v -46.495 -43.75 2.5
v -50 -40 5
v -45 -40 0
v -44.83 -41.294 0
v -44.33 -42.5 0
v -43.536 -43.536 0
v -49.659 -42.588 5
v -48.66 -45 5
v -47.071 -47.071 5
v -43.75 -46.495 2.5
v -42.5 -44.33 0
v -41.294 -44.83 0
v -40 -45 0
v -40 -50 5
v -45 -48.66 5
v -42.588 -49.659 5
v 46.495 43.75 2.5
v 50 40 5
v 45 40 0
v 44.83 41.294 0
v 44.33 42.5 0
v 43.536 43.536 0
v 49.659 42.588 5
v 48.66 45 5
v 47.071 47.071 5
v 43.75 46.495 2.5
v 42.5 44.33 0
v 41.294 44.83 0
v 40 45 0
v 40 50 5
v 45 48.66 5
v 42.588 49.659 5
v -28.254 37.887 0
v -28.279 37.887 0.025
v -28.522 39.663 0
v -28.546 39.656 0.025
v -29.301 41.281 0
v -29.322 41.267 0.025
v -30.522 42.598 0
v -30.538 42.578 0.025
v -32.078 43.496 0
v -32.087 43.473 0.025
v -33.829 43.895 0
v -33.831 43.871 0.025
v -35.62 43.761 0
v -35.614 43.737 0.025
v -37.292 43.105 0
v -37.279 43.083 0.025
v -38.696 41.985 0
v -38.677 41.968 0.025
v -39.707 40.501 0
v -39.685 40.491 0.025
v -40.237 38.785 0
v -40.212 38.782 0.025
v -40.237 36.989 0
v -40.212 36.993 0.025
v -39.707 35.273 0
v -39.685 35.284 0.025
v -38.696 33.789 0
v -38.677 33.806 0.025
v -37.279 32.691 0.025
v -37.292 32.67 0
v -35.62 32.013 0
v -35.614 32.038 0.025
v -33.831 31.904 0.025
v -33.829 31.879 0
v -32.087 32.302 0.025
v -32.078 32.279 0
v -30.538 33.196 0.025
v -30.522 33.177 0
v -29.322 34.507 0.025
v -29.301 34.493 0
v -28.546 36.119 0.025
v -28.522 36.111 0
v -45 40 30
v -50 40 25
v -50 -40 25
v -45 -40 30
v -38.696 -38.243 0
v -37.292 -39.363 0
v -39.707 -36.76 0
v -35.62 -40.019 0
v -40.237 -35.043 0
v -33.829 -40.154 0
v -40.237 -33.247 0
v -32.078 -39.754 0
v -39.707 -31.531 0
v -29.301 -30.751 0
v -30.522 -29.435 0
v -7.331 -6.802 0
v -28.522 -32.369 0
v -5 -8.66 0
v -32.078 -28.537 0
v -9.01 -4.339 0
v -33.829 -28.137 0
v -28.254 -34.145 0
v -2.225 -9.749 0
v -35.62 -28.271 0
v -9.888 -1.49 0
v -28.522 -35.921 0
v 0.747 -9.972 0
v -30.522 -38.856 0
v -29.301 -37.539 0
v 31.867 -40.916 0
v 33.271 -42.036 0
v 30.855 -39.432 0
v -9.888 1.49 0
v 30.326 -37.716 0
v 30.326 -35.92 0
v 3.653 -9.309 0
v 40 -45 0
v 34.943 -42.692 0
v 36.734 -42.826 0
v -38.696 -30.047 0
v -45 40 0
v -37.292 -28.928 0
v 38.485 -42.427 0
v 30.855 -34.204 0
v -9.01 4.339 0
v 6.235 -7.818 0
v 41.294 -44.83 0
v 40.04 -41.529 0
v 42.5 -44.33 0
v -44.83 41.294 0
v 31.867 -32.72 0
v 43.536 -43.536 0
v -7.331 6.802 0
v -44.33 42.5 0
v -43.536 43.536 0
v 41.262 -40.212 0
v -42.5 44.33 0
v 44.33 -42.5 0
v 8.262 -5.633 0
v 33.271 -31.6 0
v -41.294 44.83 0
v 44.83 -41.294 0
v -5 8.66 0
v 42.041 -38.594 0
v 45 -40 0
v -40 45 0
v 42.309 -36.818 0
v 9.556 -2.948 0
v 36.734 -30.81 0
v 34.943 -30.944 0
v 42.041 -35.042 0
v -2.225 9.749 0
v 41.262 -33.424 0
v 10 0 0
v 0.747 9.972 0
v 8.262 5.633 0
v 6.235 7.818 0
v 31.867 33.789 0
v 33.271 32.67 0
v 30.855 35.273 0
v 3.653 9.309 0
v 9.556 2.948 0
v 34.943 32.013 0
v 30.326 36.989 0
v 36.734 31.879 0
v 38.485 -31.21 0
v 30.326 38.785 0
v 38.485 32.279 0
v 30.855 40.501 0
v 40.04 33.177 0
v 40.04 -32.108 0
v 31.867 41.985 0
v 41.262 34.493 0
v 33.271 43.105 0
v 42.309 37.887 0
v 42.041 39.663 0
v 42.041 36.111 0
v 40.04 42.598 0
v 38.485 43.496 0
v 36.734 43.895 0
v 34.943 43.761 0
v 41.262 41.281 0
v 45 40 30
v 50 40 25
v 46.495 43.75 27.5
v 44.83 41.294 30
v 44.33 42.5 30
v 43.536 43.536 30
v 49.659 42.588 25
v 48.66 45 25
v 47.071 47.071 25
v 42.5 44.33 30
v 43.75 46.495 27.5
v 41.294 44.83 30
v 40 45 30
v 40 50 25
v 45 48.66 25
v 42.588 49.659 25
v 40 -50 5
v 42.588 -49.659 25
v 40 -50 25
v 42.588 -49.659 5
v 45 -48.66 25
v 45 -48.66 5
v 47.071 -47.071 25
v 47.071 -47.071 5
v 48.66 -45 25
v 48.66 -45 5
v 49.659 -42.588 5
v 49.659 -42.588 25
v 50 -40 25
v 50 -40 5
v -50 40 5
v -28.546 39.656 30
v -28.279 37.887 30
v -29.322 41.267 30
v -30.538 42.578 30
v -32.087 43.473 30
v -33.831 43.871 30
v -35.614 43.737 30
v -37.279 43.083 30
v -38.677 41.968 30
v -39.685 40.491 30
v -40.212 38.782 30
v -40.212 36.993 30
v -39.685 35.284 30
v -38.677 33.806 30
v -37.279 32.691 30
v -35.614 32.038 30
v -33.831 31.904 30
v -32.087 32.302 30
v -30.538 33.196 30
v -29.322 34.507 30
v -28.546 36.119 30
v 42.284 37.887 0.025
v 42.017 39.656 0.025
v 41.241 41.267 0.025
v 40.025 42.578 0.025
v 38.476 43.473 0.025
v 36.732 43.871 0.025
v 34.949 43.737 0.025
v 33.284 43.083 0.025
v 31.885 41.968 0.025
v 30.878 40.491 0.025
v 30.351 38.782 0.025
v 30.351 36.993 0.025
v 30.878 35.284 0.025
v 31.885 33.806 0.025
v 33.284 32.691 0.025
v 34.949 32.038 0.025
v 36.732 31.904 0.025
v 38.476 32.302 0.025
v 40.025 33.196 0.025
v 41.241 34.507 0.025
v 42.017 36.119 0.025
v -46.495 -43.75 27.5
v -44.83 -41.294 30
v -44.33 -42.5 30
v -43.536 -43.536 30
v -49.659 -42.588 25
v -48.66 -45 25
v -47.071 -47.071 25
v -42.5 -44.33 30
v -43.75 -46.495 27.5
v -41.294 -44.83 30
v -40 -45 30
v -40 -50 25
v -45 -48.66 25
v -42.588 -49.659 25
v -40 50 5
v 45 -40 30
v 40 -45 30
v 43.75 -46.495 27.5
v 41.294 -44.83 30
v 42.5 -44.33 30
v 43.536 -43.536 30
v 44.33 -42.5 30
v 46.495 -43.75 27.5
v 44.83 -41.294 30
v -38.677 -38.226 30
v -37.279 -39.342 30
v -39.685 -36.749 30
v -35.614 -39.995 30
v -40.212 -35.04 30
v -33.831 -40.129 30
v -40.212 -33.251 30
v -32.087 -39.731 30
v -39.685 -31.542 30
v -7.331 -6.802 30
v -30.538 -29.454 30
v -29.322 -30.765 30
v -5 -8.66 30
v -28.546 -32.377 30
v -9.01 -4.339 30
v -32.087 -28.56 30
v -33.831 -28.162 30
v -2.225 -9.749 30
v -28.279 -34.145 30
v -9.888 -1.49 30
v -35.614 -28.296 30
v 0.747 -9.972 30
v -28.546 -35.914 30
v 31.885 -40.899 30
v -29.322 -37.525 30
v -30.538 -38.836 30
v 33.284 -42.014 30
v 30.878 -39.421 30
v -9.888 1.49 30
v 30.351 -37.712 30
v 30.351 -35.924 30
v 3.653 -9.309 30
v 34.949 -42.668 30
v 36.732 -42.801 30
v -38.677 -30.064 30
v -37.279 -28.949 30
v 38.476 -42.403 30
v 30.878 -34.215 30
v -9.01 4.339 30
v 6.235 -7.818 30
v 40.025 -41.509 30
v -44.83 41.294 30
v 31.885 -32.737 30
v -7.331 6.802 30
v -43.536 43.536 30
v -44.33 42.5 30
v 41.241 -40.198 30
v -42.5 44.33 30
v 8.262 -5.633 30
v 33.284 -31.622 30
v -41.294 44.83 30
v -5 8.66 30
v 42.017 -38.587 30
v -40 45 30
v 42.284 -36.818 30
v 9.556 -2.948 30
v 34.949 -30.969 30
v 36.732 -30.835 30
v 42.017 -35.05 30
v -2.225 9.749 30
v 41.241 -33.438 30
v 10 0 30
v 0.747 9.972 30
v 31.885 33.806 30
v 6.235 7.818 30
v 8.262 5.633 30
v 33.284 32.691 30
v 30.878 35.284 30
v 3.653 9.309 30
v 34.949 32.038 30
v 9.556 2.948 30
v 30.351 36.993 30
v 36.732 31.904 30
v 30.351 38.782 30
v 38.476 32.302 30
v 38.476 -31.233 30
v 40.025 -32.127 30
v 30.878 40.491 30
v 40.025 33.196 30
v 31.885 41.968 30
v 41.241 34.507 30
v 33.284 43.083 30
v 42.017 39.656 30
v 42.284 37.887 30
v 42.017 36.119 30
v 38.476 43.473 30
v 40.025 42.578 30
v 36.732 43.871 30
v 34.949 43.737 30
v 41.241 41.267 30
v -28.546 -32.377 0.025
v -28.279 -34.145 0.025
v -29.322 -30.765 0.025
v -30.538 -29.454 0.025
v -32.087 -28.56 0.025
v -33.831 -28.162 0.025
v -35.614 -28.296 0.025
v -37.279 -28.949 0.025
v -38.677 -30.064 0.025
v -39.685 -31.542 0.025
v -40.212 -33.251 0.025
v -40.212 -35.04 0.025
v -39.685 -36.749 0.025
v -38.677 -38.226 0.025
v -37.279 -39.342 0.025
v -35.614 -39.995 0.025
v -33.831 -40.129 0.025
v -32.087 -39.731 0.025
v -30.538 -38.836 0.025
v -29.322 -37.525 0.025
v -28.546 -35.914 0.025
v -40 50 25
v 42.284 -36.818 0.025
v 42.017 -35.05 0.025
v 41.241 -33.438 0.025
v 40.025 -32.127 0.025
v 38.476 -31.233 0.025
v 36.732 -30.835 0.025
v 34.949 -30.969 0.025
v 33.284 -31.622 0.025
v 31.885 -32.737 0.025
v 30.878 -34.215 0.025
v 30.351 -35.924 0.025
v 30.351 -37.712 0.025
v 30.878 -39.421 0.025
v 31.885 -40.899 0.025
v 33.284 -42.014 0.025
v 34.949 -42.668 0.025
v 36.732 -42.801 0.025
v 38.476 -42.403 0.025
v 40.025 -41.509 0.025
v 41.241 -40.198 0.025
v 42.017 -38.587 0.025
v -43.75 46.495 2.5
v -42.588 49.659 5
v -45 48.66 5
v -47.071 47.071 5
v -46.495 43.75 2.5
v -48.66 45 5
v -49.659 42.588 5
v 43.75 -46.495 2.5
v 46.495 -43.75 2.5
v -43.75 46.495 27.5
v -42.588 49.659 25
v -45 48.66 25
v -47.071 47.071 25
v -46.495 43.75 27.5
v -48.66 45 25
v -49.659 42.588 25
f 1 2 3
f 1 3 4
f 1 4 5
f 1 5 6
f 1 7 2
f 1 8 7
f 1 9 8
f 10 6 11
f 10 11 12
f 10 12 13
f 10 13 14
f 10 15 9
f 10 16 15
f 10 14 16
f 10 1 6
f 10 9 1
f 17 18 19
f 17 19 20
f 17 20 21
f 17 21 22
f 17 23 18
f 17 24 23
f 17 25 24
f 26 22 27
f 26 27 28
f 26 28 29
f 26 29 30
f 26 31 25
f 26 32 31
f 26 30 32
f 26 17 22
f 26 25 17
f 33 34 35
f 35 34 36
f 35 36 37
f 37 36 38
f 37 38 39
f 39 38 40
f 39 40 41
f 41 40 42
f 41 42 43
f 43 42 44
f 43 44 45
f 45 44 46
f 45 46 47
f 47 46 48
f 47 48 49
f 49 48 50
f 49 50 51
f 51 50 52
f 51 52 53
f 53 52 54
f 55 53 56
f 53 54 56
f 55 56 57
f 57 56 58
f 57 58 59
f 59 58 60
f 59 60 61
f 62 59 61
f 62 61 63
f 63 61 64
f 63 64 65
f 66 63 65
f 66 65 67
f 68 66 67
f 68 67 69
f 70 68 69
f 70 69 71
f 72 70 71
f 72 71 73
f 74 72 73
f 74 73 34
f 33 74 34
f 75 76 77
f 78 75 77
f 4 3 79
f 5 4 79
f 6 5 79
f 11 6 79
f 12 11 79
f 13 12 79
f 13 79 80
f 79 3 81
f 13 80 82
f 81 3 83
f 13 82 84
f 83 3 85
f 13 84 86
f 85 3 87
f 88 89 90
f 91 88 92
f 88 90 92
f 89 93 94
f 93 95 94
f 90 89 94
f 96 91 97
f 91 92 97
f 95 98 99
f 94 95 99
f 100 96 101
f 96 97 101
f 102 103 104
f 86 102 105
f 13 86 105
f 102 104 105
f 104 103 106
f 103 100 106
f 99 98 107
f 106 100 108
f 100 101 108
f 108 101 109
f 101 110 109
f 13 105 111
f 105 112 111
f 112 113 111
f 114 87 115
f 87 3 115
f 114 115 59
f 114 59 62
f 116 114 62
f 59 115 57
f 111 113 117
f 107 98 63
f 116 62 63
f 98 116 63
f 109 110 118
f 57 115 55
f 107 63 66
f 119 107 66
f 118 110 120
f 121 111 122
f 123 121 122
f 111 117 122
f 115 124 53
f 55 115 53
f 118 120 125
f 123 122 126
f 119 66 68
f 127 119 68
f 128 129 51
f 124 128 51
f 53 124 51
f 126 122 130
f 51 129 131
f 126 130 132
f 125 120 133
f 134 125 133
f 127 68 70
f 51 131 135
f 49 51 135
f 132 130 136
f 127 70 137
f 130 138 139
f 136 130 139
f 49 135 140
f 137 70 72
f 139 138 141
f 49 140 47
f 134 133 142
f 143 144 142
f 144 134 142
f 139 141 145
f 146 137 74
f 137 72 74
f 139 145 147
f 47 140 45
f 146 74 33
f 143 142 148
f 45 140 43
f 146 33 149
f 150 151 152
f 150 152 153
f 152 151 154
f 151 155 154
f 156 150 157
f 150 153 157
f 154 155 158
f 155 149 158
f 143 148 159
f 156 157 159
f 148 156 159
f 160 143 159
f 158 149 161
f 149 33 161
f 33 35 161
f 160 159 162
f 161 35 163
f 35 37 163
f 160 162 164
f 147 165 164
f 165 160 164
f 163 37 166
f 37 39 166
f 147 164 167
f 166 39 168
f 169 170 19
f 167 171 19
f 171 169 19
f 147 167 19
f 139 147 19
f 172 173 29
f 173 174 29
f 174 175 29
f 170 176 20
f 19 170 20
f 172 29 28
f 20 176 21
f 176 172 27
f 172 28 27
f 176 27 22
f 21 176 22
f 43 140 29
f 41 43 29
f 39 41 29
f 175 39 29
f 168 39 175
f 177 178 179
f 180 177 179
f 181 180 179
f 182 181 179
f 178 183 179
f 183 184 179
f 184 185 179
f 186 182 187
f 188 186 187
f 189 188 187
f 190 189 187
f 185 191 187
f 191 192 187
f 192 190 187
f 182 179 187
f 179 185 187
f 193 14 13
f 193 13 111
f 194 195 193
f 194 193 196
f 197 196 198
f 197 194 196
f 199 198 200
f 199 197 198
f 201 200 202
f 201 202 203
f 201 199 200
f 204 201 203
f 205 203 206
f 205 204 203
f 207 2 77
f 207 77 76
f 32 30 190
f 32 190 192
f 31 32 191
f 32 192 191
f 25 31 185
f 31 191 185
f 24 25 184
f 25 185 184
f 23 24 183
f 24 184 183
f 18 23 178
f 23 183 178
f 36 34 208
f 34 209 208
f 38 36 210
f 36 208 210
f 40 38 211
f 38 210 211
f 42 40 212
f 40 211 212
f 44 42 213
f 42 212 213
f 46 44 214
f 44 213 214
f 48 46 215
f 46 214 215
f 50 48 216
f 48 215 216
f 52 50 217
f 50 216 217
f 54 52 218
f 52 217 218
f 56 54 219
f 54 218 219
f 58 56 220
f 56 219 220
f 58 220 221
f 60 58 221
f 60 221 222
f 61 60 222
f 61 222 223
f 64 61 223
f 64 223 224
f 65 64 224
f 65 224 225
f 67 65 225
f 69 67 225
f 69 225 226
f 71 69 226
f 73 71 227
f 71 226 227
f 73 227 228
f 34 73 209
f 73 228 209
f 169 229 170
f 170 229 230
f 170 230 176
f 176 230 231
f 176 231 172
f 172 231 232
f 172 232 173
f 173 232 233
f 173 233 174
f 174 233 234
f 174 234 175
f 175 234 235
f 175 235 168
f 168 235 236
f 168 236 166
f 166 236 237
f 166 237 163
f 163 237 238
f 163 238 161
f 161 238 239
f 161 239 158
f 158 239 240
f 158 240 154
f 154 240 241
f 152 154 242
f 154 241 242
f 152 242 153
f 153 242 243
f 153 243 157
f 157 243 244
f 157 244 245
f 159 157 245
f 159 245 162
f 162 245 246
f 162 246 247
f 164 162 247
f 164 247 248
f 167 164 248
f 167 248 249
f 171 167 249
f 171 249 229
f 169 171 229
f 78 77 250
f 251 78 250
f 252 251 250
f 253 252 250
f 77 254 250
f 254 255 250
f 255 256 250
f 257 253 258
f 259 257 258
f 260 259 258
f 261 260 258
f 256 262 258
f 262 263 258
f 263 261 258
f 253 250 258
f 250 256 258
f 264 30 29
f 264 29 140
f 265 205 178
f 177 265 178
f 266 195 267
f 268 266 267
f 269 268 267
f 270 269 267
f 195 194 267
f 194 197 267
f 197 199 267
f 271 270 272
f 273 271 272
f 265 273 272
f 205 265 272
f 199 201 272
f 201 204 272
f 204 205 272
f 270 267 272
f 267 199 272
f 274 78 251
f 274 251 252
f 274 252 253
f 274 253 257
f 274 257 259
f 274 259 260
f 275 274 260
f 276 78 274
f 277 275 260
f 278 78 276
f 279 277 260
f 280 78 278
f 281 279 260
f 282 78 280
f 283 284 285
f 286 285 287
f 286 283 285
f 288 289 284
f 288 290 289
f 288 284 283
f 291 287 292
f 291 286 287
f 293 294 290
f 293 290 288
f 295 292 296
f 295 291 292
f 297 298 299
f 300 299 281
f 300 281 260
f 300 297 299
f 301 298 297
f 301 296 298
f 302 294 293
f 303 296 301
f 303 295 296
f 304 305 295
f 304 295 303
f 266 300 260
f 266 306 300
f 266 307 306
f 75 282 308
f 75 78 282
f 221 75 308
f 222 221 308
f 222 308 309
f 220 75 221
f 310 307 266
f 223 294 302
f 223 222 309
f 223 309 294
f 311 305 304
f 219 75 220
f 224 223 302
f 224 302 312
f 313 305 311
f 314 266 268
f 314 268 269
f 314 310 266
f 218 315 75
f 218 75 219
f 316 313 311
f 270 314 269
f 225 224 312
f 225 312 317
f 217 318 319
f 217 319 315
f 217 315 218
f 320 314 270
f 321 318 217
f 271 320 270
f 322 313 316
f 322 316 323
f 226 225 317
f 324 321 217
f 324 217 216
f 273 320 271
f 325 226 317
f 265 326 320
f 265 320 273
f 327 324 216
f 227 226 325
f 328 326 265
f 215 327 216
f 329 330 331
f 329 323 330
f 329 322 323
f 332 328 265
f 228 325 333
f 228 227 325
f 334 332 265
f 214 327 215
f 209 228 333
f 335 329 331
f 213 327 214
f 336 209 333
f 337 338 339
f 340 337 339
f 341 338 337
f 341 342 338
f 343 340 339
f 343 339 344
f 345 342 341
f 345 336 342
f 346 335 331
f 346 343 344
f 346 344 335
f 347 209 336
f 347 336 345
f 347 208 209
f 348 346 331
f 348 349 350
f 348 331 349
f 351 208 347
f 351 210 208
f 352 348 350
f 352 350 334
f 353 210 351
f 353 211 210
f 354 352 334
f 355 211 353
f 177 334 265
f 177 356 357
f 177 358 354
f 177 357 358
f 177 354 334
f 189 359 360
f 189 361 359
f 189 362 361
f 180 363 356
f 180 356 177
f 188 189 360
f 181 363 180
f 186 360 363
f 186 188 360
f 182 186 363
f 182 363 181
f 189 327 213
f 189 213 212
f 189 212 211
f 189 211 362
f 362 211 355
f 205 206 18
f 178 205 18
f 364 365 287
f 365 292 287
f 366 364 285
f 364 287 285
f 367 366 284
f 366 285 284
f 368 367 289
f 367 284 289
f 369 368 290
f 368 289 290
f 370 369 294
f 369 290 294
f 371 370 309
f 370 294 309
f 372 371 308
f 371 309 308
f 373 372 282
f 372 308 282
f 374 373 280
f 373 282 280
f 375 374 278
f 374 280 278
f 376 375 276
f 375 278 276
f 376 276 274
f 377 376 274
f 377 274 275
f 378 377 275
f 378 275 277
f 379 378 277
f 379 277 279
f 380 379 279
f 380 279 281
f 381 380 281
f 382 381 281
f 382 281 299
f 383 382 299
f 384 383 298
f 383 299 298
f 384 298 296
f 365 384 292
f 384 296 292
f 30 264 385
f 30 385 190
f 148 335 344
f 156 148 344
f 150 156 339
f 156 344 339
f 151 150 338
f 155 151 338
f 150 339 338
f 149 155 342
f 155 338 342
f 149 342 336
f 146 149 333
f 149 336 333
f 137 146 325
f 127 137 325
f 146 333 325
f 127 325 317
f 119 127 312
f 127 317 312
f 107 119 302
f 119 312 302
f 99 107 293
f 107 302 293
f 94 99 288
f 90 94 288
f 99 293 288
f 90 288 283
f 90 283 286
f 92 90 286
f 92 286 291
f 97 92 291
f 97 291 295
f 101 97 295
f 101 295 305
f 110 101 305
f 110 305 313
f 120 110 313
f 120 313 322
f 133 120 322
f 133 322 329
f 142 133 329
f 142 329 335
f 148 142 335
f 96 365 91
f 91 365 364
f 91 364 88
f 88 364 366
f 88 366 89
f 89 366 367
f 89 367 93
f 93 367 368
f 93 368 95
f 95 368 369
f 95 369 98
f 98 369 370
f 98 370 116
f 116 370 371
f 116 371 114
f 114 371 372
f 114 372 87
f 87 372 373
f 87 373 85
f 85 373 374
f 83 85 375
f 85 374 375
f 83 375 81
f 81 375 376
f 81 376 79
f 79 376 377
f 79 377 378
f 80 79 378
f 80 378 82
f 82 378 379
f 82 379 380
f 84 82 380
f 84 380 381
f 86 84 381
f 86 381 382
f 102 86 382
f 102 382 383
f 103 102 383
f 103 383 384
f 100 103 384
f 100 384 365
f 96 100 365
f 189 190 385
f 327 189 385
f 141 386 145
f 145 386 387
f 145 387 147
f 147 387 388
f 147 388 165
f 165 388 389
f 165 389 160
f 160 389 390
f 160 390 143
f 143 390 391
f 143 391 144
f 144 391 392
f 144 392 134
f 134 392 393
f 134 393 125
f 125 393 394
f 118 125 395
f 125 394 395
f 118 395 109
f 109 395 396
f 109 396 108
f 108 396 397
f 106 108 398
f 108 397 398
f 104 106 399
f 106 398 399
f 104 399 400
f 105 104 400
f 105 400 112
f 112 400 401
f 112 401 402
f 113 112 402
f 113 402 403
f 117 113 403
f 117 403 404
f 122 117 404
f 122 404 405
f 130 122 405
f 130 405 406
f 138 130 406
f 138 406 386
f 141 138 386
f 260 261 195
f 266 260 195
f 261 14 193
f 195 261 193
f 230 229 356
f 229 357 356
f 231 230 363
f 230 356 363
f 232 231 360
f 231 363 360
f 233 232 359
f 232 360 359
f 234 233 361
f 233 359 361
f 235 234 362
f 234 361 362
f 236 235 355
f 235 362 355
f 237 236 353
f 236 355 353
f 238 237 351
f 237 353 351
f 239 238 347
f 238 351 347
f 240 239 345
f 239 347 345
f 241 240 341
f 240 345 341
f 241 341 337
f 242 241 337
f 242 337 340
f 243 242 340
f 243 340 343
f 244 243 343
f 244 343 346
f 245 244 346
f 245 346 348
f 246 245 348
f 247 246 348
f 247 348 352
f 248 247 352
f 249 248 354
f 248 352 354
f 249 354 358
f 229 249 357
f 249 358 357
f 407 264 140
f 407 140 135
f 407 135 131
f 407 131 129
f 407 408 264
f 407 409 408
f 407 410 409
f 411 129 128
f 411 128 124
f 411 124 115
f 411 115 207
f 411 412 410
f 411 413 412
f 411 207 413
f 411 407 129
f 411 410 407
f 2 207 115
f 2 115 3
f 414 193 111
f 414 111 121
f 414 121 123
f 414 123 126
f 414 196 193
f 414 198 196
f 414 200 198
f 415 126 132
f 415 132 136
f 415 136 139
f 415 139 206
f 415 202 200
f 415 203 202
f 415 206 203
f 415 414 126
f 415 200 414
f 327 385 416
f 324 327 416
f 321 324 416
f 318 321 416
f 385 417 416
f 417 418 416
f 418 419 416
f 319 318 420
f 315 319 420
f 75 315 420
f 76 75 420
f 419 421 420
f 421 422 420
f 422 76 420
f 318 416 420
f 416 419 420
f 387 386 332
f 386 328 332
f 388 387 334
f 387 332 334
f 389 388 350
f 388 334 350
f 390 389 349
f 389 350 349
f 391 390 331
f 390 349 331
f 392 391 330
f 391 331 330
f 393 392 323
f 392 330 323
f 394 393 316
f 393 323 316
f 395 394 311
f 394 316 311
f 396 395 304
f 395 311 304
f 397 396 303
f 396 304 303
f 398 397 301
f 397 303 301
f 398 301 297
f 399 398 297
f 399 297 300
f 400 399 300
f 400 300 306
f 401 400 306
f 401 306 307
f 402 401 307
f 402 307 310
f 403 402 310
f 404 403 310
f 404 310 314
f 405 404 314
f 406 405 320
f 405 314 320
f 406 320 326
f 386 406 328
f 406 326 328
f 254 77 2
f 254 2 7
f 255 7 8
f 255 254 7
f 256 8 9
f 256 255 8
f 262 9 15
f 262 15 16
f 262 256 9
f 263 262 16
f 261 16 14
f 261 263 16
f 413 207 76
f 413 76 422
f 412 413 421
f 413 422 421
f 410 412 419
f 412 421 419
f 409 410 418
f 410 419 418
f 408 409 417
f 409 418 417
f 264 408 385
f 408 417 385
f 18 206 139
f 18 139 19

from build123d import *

# Parameters (mm, degrees)
SKETCH1_W                        = 100
SKETCH1_H                        = 100
BOSS_EXTRUDE1_DEPTH              = 30
SKETCH3_R                        = 10
CUT_EXTRUDE1_DEPTH               = 19
CUT_EXTRUDE1_DEPTH_BACK          = 31
FILLET1_R                        = 10
CHAMFER1_SIZE                    = 5
F_12_0MM_DOWEL_HOLE1_D           = 12
F_12_0MM_DOWEL_HOLE1_CSINK_D     = 12.05
F_12_0MM_DOWEL_HOLE1_CSINK_ANGLE = 90


with BuildPart() as part:
    # Sketch1 → Boss-Extrude1 (new body)
    with BuildSketch(Plane.XY):
        Rectangle(SKETCH1_W, SKETCH1_H)
    extrude(amount=BOSS_EXTRUDE1_DEPTH)

    # Sketch3 → Cut-Extrude1 (cut, two sides)
    with BuildSketch(Plane.XY.offset(30)) as cut_extrude1_sk:
        Circle(SKETCH3_R)
    extrude(amount=CUT_EXTRUDE1_DEPTH, mode=Mode.SUBTRACT)
    extrude(cut_extrude1_sk.sketch, amount=-CUT_EXTRUDE1_DEPTH_BACK, mode=Mode.SUBTRACT)

    # Fillet1
    fillet1_edges = [part.edges().sort_by_distance(p)[0] for p in [
        (-50, 50, 15),
        (50, 50, 15),
        (50, -50, 15),
        (-50, -50, 15),
    ]]
    fillet(fillet1_edges, radius=FILLET1_R)

    # Chamfer1
    chamfer1_edges = [part.edges().sort_by_distance(p)[0] for p in [
        (0, -50, 0),
        (0, -50, 30),
        (-50, 0, 0),
        (0, 50, 0),
        (50, 0, 0),
        (47.071067812, -47.071067812, 0),
        (47.071067812, 47.071067812, 0),
        (-47.071067812, 47.071067812, 0),
        (-47.071067812, -47.071067812, 0),
        (-50, 0, 30),
        (50, 0, 30),
        (0, 50, 30),
        (47.071067812, -47.071067812, 30),
        (47.071067812, 47.071067812, 30),
        (-47.071067812, 47.071067812, 30),
        (-47.071067812, -47.071067812, 30),
    ]]
    chamfer(chamfer1_edges, length=CHAMFER1_SIZE)

    # Ø12.0mm Dowel Hole1 (through all)
    with Locations(Plane(origin=(0, 0, 0), x_dir=(-1, 0, 0), z_dir=(0, 0, -1))):
        with Locations((-36.283625915, 37.887322089), (34.279005699, 37.887322089), (34.279005699, -34.145364351), (-36.283625915, -36.818191306)):
            CounterSinkHole(F_12_0MM_DOWEL_HOLE1_D / 2, F_12_0MM_DOWEL_HOLE1_CSINK_D / 2, counter_sink_angle=F_12_0MM_DOWEL_HOLE1_CSINK_ANGLE)


solid = part.part
